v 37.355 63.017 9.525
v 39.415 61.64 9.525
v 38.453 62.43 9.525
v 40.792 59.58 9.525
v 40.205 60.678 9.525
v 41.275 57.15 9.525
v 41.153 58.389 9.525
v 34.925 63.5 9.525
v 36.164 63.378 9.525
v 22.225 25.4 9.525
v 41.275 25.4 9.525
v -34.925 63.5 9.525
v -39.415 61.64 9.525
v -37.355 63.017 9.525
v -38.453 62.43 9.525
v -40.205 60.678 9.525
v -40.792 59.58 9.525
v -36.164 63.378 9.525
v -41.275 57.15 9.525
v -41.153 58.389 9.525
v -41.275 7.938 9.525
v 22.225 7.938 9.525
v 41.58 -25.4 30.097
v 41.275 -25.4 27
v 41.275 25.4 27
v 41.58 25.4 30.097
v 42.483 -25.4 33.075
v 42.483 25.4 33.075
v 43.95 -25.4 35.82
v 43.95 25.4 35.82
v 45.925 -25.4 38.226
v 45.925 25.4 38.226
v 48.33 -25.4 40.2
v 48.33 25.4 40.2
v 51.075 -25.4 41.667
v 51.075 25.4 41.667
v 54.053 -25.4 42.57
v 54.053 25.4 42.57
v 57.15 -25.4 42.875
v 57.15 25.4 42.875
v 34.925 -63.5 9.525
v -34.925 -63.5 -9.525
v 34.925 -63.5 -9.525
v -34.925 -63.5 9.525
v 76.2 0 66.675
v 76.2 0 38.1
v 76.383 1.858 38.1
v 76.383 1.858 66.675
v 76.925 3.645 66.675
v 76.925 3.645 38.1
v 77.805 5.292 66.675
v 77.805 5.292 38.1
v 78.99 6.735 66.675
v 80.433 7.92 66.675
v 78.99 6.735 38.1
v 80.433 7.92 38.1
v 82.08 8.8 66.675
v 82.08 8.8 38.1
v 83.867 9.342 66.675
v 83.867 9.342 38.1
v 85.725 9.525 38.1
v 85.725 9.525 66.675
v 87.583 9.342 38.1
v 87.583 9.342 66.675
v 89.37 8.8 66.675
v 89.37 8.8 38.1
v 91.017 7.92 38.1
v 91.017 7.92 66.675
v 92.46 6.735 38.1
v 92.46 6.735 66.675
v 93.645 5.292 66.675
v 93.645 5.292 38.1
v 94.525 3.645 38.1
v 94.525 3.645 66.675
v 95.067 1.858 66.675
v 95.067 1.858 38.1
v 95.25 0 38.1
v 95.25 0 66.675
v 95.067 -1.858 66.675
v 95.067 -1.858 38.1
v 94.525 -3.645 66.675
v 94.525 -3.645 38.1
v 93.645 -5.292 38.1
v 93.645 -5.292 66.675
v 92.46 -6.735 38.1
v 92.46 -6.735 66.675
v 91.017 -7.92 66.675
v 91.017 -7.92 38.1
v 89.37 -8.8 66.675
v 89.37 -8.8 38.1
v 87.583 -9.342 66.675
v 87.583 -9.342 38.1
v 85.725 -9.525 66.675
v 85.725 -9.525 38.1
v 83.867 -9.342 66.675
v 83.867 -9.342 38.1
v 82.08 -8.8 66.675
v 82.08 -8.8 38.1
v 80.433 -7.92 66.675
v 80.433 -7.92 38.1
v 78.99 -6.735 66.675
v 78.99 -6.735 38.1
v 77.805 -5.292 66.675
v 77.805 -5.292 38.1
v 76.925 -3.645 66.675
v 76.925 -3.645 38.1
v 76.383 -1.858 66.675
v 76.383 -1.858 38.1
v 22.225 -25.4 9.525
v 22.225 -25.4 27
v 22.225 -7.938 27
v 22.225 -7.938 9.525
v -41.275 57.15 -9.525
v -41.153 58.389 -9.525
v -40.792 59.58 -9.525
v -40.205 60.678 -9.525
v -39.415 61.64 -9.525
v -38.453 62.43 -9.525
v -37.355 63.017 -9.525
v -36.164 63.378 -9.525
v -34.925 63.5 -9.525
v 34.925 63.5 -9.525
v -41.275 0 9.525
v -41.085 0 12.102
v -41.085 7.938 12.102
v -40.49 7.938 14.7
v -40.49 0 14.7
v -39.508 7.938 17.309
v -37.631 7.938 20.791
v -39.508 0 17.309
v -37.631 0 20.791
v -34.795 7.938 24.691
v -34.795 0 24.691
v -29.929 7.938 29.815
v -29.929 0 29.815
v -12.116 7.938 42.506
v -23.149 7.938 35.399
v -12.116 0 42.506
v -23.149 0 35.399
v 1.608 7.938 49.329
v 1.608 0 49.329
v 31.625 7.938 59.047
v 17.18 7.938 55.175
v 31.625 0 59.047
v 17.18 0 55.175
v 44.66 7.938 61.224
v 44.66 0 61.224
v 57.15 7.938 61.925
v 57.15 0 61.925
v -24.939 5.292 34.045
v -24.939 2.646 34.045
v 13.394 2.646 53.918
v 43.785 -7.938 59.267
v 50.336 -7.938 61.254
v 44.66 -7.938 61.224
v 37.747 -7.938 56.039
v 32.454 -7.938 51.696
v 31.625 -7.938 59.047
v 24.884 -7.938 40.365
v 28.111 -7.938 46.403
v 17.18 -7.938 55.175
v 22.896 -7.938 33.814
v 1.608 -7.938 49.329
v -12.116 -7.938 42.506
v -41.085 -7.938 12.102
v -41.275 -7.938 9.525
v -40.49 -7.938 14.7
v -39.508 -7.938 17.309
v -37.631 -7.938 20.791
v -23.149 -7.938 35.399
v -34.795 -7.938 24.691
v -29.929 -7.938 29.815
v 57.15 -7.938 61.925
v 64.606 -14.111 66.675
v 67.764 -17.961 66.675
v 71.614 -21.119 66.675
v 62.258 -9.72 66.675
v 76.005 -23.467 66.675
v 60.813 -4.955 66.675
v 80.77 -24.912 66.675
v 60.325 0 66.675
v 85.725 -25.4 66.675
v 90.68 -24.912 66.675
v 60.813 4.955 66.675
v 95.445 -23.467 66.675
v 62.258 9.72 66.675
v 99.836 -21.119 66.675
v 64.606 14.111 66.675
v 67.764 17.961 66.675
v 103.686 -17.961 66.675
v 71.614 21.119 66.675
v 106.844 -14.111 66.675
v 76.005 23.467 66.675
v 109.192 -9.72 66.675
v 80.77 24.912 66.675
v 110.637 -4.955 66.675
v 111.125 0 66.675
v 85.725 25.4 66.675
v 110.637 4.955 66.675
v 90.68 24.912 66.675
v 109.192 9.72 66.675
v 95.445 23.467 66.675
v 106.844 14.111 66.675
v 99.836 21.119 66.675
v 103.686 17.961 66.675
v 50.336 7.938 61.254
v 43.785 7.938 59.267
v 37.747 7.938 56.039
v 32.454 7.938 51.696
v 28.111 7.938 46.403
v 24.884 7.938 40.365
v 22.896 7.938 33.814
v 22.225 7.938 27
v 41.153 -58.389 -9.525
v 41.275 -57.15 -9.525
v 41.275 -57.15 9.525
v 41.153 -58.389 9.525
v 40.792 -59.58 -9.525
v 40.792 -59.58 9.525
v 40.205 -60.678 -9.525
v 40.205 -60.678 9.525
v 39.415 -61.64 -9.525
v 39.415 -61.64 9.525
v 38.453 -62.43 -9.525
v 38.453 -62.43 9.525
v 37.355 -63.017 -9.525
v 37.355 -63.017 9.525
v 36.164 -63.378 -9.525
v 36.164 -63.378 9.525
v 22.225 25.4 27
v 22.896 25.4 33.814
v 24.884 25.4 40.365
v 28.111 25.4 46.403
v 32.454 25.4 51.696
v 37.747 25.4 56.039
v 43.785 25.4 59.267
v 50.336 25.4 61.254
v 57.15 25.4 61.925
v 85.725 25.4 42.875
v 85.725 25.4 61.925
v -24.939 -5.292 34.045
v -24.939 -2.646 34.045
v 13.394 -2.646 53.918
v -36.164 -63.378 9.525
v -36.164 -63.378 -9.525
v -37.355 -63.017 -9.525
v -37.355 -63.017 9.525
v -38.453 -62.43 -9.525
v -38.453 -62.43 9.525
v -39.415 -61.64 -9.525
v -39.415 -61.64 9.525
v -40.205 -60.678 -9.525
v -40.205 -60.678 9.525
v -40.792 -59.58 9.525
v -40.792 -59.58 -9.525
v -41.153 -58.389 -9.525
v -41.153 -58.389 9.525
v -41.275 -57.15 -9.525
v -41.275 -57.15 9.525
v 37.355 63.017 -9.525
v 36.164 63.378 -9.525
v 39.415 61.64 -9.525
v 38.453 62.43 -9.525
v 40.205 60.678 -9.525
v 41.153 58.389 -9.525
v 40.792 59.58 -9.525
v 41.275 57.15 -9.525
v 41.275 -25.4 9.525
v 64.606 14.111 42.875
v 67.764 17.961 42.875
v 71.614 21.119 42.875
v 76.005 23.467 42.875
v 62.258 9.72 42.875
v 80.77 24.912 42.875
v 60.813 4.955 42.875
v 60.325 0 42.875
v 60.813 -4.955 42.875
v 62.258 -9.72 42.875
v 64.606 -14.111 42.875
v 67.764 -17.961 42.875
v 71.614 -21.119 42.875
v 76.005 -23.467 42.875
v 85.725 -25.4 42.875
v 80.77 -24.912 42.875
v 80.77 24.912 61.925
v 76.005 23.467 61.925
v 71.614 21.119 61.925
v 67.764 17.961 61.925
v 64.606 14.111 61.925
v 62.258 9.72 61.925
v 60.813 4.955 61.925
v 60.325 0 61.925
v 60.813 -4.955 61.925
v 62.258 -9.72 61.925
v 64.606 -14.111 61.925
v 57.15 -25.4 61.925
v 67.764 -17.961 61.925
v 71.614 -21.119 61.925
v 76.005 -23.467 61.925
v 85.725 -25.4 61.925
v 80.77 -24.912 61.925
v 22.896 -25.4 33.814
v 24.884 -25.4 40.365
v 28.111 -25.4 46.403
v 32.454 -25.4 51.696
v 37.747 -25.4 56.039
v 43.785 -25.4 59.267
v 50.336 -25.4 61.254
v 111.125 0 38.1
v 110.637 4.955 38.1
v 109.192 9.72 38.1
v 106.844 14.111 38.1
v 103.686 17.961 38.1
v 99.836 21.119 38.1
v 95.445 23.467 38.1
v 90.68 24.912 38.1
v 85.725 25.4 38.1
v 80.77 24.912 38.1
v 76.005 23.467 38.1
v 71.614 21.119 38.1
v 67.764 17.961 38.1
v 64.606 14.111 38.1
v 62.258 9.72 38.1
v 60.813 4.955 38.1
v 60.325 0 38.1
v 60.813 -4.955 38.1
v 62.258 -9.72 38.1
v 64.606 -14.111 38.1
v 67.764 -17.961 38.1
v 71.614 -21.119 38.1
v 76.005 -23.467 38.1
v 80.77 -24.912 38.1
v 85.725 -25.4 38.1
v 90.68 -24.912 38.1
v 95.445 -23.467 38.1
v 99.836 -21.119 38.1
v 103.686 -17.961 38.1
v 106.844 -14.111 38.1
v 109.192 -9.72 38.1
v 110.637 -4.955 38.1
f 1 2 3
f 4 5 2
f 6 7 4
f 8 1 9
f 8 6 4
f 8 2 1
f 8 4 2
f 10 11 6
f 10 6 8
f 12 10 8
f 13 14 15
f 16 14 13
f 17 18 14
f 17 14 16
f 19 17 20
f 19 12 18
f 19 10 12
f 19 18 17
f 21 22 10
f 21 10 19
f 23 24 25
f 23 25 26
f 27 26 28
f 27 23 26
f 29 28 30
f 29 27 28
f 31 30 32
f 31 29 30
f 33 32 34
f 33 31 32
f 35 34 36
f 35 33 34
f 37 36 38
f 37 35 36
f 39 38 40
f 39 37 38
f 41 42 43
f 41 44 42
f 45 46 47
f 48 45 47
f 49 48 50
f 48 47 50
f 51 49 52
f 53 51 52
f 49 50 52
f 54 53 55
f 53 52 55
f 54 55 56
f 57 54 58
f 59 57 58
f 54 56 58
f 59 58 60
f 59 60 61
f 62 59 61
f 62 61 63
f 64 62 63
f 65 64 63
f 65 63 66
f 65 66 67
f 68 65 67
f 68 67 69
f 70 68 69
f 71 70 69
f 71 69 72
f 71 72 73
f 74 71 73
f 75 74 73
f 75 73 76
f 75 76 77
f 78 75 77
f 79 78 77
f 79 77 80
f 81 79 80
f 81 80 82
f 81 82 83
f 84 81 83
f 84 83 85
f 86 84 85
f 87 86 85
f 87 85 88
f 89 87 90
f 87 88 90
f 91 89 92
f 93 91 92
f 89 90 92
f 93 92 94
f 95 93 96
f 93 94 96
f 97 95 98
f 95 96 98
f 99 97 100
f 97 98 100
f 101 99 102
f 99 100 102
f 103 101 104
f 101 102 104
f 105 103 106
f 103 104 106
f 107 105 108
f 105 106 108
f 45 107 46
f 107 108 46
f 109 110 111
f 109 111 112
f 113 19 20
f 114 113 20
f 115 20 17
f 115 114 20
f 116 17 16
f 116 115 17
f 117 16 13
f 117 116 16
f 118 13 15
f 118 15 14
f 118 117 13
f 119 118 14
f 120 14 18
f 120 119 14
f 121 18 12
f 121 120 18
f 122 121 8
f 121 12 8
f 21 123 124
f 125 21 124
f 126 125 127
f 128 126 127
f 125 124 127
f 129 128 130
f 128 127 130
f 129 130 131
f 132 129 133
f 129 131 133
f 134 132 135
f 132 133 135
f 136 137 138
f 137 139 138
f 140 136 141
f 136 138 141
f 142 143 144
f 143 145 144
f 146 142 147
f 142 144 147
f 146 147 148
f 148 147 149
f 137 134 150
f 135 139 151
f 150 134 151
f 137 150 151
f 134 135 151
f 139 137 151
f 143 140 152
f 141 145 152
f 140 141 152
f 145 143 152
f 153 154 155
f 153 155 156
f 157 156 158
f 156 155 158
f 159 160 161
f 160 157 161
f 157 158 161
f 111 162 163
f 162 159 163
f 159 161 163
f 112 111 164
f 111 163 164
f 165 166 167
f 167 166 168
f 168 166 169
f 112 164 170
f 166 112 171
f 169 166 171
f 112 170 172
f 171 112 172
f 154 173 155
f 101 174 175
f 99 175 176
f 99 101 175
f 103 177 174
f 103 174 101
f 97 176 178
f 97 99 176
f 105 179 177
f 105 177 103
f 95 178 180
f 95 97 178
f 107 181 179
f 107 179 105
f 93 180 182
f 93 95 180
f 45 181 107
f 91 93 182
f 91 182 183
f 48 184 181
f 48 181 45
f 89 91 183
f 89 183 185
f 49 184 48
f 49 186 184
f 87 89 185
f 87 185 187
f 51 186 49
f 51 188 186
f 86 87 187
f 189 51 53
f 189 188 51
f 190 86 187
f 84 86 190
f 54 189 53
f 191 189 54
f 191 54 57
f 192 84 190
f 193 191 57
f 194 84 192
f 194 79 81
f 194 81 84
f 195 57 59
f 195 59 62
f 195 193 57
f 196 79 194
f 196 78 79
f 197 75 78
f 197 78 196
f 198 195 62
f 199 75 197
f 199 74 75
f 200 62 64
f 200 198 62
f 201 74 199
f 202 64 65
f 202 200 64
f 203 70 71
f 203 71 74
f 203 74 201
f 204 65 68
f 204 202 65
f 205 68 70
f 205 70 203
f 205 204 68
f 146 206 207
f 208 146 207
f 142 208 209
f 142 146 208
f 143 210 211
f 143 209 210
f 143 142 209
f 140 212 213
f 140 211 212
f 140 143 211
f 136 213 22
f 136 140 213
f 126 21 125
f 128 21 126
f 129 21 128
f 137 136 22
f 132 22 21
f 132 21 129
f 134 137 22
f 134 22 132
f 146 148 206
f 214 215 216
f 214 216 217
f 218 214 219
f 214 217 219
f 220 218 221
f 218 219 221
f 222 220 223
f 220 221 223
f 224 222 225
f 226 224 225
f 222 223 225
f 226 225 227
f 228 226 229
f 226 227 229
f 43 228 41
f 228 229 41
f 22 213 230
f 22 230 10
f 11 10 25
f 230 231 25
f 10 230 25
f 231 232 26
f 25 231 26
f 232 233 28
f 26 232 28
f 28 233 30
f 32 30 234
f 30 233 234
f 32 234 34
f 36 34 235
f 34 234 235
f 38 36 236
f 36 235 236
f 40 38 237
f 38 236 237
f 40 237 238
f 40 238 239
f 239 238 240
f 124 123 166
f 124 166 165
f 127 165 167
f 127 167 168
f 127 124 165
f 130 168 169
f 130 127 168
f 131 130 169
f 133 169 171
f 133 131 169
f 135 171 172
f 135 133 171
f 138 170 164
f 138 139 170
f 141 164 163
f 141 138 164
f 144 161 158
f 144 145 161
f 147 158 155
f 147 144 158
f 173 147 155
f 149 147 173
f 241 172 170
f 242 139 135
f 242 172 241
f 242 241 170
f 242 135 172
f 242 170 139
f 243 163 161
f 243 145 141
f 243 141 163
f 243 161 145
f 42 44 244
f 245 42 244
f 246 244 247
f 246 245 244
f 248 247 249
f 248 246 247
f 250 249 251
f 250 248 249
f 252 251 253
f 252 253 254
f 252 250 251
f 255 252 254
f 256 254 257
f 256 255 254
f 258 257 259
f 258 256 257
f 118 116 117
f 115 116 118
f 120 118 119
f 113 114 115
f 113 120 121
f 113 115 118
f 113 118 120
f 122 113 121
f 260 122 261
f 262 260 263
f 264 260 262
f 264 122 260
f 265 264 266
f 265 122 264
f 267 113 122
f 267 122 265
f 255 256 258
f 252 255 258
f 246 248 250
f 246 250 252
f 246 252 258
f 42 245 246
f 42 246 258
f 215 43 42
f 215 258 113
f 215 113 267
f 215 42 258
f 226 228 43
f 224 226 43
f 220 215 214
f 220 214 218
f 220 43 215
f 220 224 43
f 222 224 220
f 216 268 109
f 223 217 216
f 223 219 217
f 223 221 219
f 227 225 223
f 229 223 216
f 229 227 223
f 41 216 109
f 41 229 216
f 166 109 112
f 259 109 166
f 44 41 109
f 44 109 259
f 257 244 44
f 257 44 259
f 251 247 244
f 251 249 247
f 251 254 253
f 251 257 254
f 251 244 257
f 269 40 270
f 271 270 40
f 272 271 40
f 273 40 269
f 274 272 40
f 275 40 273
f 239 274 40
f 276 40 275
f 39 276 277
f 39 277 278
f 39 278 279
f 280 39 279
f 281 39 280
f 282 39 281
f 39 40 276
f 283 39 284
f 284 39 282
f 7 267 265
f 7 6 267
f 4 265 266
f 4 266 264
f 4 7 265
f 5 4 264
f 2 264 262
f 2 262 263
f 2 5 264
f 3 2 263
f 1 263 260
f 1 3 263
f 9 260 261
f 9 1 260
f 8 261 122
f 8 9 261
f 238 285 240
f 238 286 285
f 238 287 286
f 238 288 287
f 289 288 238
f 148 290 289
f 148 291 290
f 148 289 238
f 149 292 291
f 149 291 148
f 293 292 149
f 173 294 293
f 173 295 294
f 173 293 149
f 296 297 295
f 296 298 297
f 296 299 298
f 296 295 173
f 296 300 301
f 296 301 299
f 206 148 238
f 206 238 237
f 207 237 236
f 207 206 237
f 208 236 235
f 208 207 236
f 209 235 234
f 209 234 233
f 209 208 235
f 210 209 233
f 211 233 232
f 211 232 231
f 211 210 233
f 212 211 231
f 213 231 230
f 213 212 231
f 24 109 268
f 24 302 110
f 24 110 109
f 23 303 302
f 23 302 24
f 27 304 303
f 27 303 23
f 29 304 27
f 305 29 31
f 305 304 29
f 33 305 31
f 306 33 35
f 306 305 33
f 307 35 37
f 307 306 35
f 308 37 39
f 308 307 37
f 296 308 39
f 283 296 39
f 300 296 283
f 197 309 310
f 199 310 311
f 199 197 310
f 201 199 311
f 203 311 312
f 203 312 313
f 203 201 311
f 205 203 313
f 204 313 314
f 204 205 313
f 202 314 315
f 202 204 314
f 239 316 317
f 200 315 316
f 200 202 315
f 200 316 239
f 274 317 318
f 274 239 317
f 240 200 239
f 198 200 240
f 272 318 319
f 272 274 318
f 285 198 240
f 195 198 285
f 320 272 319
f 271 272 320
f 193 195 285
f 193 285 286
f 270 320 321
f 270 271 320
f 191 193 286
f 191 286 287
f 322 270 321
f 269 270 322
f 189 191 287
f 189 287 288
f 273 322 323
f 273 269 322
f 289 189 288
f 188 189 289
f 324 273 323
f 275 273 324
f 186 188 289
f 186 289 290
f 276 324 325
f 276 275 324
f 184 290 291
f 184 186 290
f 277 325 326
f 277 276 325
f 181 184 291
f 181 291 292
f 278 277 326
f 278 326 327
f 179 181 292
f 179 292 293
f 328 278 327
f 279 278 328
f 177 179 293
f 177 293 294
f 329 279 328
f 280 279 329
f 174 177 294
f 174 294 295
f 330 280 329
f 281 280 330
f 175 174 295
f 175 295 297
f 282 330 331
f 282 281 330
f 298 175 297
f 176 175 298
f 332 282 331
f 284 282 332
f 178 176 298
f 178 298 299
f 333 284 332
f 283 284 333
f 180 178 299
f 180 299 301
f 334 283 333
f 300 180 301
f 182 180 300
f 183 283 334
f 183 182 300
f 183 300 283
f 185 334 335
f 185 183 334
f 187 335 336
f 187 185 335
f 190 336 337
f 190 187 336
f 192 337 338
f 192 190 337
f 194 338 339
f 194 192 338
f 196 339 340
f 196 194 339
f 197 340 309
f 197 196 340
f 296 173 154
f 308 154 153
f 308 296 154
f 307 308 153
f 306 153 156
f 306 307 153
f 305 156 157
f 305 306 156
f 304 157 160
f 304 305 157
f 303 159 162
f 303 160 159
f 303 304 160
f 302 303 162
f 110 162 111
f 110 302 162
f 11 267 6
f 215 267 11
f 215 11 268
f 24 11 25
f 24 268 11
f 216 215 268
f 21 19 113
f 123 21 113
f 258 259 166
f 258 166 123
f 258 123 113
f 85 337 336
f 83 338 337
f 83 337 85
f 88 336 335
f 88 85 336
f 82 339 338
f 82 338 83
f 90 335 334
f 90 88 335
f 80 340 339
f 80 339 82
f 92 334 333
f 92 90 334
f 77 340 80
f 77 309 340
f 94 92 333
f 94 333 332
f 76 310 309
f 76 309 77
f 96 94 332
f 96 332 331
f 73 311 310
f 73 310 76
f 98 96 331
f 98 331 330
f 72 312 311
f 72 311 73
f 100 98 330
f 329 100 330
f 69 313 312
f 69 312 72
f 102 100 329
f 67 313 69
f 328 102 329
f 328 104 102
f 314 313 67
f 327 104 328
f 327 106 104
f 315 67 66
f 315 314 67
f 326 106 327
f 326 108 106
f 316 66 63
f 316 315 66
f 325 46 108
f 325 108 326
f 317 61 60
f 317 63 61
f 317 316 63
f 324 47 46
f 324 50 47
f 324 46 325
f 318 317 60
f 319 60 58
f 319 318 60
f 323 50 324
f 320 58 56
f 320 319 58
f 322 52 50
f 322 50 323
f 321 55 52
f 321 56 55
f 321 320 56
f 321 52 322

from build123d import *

# Parameters (mm, degrees)
F1_DEPTH = 63.5
F2_DEPTH = 25.4
F3_DEPTH = 7.9375
F5_R     = 6.35
F7_D     = 19.05


with BuildPart() as f1:
    # F0 (on Front) → F1 (new body, symmetric)
    with BuildSketch(Plane.XZ):
        Polygon((-41.275, -9.525), (41.275, -9.525), (41.275, 9.525), (22.225, 9.525), (-41.275, 9.525), align=None)
    extrude(amount=F1_DEPTH, both=True)

    # F0 (on Front) → F2 (join, symmetric)
    with BuildSketch(Plane.XZ):
        with BuildLine():
            Line((22.225, 9.525), (41.275, 9.525))
            Line((41.275, 9.525), (41.275, 27.0002))
            ThreePointArc((41.275, 27.0002), (45.92468, 38.22552), (57.15, 42.8752))
            Line((57.15, 42.8752), (60.325, 42.8752))
            Line((60.325, 42.8752), (60.325, 61.9252))
            Line((60.325, 61.9252), (57.15, 61.9252))
            ThreePointArc((57.15, 61.9252), (32.454296, 51.695904), (22.225, 27.0002))
            Line((22.225, 27.0002), (22.225, 9.525))
        make_face()
        Polygon((85.725, 61.9252), (60.325, 61.9252), (60.325, 42.8752), (85.725, 42.8752), (85.725, 52.3875), align=None)
    extrude(amount=F2_DEPTH, both=True)

    # F0 (on Front) → F3 (join, symmetric)
    with BuildSketch(Plane.XZ):
        with BuildLine():
            add(Edge.make_bspline(
                [(-41.275, 9.525), (-41.461322, 33.962093), (16.207486, 62.256526), (57.15, 61.9252)],
                knots=[0, 0, 0, 0, 111.504536, 111.504536, 111.504536, 111.504536], degree=3))
            Line((-41.275, 9.525), (22.225, 9.525))
            Line((22.225, 9.525), (22.225, 27.0002))
            ThreePointArc((22.225, 27.0002), (32.454296, 51.695904), (57.15, 61.9252))
        make_face()
    extrude(amount=F3_DEPTH, both=True)

    # F0 (on Front) → F4 (revolve)
    with BuildSketch(Plane.XZ):
        Polygon((85.725, 66.675), (85.725, 61.9252), (85.725, 52.3875), (85.725, 42.8752), (85.725, 38.1), (111.125, 38.1), (111.125, 66.675), align=None)
    revolve(axis=Axis((85.725, 0, 57.15635), (0, 0, 1)))

    # F5
    f5_edges = [f1.edges().sort_by_distance(p)[0] for p in [
        (41.275, -63.5, 0),
        (-41.275, -63.5, 0),
        (41.275, 63.5, 0),
        (-41.275, 63.5, 0),
    ]]
    fillet(f5_edges, radius=F5_R)

    # F7 (through all)
    with Locations(Plane.XY.offset(66.675)):
        with Locations((85.725, 0)):
            Hole(F7_D / 2)


solid = f1.part
